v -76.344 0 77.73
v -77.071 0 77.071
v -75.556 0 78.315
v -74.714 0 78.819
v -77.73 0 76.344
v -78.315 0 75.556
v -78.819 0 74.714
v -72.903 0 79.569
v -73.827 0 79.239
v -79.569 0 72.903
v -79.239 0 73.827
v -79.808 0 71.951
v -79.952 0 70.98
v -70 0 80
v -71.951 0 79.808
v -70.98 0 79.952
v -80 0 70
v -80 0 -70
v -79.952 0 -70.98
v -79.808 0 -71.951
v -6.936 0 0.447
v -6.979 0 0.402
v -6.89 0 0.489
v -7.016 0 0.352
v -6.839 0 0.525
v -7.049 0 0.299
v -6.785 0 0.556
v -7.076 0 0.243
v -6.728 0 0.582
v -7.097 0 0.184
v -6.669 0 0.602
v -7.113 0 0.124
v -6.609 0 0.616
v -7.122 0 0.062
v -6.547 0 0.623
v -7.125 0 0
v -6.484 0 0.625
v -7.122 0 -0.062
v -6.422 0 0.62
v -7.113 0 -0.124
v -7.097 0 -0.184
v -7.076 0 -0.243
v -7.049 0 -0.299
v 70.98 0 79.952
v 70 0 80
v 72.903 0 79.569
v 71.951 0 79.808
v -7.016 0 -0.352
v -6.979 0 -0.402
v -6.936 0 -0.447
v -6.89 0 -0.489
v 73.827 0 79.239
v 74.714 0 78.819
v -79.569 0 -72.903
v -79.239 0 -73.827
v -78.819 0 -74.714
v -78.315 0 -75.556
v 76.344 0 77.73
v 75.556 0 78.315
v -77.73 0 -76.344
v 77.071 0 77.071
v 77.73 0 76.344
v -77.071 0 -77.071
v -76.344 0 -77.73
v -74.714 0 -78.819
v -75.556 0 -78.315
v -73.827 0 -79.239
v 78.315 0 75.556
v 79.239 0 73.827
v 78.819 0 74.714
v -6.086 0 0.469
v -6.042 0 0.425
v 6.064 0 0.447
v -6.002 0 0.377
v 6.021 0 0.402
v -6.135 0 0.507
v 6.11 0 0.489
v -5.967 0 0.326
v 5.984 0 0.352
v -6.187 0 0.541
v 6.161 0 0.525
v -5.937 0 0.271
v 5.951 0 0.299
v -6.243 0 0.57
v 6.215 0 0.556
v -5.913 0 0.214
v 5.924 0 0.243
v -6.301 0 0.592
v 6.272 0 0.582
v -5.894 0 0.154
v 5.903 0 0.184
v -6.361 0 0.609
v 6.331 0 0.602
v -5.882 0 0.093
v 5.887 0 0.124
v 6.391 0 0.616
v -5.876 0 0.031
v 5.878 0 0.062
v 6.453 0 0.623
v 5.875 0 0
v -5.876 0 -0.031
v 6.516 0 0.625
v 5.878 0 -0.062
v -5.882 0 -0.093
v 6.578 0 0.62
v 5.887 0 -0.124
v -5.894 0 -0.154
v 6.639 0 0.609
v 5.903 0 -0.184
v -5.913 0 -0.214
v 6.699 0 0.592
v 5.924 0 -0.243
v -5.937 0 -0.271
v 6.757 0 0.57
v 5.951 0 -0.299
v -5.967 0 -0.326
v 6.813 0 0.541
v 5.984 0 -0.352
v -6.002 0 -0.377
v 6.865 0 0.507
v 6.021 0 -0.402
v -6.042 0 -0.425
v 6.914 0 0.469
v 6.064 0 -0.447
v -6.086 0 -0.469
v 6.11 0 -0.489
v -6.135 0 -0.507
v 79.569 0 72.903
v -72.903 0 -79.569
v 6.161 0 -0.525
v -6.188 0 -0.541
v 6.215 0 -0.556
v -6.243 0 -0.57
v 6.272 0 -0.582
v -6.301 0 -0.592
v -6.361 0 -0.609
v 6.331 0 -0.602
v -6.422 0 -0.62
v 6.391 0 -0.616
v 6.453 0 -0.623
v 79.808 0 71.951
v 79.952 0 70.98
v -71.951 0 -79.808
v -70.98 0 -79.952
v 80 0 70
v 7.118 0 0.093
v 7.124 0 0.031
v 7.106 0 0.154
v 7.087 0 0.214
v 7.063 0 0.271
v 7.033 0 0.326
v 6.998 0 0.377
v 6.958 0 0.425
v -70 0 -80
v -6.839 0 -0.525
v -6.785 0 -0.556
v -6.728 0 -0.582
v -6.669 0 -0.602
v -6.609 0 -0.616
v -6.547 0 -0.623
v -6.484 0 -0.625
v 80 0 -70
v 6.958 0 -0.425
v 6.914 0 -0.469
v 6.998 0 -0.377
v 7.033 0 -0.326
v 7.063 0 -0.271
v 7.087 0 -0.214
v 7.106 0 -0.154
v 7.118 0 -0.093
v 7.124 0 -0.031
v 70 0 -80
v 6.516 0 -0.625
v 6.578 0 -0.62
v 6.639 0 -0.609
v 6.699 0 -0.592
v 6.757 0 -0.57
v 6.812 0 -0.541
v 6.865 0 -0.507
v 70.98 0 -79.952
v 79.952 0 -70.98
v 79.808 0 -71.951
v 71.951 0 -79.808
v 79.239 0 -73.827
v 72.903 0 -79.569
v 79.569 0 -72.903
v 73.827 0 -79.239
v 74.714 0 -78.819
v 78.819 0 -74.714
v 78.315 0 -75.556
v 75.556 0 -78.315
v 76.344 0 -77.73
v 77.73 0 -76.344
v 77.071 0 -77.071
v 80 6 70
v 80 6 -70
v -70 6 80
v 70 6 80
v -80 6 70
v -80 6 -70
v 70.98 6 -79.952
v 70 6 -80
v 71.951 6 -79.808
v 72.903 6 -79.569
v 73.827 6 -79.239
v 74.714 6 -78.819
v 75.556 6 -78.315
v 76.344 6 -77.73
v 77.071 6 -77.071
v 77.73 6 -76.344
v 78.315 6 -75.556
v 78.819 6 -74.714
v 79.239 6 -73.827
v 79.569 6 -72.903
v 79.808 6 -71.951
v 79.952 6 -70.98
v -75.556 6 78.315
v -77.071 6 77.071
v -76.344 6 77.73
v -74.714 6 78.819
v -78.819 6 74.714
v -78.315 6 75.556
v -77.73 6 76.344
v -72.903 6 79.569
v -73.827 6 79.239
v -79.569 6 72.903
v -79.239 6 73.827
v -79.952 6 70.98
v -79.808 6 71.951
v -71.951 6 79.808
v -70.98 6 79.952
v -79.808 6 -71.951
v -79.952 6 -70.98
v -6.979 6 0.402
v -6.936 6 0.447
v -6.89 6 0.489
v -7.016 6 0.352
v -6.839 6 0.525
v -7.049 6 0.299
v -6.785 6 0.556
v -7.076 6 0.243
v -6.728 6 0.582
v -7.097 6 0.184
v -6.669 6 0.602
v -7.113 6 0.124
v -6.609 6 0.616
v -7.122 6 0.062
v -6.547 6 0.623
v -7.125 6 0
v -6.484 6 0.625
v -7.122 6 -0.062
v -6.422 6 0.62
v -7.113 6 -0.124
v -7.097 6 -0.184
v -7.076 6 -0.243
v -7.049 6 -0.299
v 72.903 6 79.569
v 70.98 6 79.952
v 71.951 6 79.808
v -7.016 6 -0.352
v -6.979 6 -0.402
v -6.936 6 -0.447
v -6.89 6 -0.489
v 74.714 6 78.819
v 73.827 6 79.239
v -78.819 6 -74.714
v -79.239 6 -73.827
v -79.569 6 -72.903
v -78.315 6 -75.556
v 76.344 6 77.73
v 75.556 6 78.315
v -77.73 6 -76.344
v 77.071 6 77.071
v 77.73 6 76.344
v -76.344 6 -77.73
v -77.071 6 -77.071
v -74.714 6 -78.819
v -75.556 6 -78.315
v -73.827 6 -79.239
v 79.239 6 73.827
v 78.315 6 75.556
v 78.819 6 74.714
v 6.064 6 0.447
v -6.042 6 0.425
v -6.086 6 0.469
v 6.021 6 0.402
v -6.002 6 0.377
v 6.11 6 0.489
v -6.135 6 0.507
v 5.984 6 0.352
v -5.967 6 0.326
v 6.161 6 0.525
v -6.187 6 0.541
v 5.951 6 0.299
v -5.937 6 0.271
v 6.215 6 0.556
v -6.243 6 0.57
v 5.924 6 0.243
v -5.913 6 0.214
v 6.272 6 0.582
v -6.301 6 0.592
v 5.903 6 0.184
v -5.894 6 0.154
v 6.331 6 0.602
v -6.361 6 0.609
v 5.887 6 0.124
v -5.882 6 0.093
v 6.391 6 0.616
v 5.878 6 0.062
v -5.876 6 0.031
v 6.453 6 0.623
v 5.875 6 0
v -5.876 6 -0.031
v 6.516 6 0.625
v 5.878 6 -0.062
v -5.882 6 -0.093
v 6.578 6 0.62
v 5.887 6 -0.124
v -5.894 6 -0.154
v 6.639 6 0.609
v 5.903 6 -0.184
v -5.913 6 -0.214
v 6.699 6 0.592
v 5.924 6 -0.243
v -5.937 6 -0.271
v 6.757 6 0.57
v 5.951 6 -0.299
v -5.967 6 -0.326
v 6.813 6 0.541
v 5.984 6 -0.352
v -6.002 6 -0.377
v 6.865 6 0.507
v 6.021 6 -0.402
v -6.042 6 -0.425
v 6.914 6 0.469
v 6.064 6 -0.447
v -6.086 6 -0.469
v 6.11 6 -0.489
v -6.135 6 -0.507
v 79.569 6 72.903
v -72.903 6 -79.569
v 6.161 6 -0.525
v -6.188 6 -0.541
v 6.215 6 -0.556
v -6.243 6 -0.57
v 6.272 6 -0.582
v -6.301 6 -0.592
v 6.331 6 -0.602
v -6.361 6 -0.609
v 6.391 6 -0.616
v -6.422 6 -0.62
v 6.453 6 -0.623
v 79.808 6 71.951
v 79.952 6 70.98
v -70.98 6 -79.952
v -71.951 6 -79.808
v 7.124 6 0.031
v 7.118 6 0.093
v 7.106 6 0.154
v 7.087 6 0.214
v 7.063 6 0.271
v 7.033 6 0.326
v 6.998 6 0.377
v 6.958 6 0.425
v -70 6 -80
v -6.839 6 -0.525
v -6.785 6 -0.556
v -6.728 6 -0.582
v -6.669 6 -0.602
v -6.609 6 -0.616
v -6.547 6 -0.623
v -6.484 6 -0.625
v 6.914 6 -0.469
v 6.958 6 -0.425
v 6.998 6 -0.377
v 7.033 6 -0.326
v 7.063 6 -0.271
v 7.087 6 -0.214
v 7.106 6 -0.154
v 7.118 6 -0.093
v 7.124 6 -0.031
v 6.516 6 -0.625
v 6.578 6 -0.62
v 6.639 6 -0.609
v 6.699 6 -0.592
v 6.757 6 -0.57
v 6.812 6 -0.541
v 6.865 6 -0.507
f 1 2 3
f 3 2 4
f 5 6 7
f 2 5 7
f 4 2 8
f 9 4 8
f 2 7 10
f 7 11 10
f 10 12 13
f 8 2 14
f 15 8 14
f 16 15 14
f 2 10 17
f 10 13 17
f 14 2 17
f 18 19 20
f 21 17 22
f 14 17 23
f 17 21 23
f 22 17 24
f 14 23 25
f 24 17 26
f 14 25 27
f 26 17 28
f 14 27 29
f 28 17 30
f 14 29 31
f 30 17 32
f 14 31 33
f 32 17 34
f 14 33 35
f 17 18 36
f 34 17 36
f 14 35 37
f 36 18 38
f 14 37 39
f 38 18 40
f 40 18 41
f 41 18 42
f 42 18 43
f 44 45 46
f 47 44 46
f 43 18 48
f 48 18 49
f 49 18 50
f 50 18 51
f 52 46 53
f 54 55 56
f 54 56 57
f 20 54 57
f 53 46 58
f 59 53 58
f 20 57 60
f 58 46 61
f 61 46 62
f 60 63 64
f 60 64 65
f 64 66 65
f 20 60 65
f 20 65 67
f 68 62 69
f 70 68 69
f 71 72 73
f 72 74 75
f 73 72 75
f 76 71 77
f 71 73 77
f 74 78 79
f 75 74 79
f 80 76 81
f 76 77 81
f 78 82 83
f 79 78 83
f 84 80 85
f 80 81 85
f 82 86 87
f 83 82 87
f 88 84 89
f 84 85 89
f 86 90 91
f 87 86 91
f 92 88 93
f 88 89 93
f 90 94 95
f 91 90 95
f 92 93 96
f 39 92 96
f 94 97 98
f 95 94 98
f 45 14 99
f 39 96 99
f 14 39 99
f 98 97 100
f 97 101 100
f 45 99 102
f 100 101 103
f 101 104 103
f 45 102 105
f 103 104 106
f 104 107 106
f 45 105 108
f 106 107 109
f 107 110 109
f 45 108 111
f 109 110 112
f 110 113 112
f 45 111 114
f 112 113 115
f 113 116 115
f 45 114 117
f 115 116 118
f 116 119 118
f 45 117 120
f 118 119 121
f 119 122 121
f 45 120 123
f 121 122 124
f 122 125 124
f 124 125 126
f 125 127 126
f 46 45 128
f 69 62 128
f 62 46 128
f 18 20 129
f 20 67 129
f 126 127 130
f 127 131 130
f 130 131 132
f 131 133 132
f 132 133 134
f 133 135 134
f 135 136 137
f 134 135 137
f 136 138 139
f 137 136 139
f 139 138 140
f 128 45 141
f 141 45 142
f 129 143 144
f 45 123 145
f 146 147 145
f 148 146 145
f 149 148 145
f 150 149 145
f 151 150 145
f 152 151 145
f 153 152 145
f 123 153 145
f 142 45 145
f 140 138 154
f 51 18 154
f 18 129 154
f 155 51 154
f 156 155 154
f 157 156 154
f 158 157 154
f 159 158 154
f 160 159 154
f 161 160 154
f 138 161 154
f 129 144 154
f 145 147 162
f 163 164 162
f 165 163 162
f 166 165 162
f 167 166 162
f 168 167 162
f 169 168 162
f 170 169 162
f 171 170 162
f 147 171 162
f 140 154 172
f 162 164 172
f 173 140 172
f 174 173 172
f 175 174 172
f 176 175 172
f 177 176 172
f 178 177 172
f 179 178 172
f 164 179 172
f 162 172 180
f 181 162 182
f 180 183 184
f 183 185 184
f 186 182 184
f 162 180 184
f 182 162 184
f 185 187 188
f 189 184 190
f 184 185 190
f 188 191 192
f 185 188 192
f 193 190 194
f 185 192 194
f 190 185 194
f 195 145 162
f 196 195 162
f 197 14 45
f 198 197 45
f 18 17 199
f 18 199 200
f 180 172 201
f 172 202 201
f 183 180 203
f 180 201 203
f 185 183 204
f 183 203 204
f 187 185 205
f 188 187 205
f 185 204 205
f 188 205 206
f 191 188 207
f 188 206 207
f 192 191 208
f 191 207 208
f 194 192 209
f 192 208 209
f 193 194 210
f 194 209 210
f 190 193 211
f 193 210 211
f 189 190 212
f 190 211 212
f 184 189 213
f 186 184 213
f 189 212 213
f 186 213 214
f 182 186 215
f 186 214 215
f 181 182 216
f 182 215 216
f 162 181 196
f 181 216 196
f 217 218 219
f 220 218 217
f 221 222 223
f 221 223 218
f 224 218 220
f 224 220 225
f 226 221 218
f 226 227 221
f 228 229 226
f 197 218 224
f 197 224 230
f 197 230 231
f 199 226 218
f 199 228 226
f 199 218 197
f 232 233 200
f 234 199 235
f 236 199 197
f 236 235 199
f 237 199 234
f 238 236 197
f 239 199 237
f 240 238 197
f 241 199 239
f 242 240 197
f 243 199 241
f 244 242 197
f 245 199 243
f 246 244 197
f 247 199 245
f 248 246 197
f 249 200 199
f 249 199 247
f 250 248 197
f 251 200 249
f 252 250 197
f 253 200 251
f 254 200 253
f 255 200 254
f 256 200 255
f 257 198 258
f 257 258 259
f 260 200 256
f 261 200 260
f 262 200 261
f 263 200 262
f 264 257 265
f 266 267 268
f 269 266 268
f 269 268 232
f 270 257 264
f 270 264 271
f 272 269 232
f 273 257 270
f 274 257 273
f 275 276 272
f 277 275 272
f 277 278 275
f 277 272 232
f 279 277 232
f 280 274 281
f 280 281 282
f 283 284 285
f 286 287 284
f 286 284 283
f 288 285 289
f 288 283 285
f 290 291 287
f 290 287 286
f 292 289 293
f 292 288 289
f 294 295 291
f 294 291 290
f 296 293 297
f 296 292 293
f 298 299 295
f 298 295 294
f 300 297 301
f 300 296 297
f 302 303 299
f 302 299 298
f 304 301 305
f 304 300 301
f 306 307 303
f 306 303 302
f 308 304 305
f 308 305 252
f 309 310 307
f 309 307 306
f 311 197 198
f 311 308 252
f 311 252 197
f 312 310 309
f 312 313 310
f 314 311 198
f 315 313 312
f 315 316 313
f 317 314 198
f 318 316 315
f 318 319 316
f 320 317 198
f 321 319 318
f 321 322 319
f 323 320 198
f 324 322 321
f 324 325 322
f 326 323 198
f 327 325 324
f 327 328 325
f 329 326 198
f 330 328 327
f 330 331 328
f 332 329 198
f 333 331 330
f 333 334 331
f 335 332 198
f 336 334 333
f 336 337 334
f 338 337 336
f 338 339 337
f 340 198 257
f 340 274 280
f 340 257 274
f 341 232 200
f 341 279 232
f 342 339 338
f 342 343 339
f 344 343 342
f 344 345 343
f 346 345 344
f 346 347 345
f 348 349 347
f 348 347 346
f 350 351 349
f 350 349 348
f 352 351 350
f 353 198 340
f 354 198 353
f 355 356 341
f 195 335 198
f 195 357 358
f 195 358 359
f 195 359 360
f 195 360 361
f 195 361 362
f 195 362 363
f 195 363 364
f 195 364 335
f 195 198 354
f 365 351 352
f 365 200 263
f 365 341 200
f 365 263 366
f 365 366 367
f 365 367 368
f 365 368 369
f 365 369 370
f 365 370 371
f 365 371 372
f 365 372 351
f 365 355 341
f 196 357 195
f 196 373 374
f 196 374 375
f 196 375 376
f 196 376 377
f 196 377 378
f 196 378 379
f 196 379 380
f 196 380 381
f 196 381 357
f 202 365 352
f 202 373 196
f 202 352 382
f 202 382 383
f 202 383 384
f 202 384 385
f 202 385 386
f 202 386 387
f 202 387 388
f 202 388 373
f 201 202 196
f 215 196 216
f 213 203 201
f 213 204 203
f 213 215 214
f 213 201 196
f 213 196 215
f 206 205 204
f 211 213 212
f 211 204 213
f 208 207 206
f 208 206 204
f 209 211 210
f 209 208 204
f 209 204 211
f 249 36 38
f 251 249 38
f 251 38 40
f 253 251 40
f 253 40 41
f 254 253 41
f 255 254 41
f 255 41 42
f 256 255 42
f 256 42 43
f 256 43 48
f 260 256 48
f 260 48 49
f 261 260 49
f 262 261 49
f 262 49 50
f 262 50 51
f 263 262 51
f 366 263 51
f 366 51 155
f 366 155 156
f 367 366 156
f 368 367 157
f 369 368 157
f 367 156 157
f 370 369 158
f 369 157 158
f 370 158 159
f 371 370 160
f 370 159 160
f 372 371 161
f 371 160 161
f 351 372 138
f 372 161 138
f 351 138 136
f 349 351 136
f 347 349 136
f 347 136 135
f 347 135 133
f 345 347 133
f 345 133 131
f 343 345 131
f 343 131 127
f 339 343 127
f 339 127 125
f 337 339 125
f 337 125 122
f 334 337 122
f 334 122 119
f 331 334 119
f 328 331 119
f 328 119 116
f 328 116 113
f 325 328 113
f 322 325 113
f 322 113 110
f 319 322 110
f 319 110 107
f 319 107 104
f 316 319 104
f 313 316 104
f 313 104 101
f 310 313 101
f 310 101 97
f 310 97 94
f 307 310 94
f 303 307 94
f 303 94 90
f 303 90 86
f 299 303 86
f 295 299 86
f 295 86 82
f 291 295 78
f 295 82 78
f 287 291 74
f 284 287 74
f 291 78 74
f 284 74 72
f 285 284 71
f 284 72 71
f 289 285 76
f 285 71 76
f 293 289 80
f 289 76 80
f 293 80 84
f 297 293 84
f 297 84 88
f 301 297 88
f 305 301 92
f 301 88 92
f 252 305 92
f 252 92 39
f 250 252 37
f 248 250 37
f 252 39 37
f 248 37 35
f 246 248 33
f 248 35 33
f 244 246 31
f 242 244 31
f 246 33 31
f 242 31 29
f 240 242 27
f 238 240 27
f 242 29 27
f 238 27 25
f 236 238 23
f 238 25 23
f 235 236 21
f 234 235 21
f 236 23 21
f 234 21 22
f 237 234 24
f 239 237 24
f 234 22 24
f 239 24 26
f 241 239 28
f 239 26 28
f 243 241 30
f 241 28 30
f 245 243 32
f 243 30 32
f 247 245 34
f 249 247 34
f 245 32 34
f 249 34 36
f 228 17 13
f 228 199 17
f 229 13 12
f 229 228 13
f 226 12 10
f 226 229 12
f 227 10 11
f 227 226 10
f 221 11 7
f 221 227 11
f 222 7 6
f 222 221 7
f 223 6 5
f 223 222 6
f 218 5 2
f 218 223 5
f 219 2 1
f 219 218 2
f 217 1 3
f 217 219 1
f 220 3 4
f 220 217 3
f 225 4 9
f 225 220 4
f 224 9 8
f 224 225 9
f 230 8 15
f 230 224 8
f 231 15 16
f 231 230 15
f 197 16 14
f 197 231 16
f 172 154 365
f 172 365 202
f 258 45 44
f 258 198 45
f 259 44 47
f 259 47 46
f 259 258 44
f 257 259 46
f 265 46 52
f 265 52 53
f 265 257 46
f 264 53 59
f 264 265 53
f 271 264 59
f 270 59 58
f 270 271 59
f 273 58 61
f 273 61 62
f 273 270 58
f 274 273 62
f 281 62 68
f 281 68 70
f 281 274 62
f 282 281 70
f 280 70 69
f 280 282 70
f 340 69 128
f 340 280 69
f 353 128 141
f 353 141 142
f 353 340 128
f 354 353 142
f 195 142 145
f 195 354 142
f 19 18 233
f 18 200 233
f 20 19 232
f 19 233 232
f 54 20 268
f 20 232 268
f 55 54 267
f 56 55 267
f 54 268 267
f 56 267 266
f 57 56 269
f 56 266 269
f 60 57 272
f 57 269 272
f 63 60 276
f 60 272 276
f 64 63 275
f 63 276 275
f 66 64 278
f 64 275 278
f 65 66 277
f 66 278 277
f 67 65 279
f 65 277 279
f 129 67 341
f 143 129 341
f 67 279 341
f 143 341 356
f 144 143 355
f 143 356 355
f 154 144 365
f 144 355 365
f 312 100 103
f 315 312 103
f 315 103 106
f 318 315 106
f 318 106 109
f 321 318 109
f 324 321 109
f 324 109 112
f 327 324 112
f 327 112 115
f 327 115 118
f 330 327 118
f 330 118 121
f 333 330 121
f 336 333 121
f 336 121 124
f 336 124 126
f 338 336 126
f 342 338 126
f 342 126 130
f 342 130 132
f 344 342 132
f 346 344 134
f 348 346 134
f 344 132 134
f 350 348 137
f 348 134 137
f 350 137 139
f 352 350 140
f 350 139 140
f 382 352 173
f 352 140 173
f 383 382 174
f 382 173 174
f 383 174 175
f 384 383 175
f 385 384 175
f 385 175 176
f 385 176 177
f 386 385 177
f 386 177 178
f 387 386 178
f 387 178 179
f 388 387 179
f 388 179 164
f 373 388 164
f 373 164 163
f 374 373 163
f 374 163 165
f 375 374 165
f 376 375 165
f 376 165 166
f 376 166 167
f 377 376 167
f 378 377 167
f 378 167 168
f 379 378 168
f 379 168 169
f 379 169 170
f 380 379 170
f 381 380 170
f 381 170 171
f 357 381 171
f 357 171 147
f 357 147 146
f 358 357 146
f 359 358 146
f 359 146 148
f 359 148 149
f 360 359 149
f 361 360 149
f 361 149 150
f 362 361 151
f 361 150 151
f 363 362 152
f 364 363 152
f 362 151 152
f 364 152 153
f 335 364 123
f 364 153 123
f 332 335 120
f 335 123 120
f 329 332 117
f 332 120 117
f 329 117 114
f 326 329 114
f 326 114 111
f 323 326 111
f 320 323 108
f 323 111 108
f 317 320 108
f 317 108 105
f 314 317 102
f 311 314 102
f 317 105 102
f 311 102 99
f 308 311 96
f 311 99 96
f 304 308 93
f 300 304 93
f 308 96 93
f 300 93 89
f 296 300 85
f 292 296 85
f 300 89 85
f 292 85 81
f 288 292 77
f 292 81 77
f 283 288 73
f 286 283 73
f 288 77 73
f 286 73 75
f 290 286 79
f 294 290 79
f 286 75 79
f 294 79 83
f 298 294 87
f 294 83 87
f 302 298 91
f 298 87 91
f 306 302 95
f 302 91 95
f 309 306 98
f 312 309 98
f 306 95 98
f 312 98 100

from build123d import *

# Parameters (mm, degrees)
SKETCH1_W           = 160
SKETCH1_H           = 160
MAIN_BODY_DEPTH     = 6
M1_6_TAPPED_HOLE1_D = 1.25
FILLET1_R           = 10


with BuildPart() as part:
    # Sketch1 → main body (new body)
    with BuildSketch(Plane(origin=(0, 0, 0), x_dir=(1, 0, 0), z_dir=(0, 1, 0))):
        Rectangle(SKETCH1_W, SKETCH1_H)
    extrude(amount=MAIN_BODY_DEPTH)

    # M1.6 Tapped Hole1 (through all)
    with Locations(Plane(origin=(0, 6, 0), x_dir=(1, 0, 0), z_dir=(0, 1, 0))):
        with Locations((6.5, 0), (-6.5, 0)):
            Hole(M1_6_TAPPED_HOLE1_D / 2)

    # Fillet1
    fillet1_edges = [part.edges().sort_by_distance(p)[0] for p in [
        (-80, 3, -80),
        (80, 3, -80),
        (80, 3, 80),
        (-80, 3, 80),
    ]]
    fillet(fillet1_edges, radius=FILLET1_R)


solid = part.part
